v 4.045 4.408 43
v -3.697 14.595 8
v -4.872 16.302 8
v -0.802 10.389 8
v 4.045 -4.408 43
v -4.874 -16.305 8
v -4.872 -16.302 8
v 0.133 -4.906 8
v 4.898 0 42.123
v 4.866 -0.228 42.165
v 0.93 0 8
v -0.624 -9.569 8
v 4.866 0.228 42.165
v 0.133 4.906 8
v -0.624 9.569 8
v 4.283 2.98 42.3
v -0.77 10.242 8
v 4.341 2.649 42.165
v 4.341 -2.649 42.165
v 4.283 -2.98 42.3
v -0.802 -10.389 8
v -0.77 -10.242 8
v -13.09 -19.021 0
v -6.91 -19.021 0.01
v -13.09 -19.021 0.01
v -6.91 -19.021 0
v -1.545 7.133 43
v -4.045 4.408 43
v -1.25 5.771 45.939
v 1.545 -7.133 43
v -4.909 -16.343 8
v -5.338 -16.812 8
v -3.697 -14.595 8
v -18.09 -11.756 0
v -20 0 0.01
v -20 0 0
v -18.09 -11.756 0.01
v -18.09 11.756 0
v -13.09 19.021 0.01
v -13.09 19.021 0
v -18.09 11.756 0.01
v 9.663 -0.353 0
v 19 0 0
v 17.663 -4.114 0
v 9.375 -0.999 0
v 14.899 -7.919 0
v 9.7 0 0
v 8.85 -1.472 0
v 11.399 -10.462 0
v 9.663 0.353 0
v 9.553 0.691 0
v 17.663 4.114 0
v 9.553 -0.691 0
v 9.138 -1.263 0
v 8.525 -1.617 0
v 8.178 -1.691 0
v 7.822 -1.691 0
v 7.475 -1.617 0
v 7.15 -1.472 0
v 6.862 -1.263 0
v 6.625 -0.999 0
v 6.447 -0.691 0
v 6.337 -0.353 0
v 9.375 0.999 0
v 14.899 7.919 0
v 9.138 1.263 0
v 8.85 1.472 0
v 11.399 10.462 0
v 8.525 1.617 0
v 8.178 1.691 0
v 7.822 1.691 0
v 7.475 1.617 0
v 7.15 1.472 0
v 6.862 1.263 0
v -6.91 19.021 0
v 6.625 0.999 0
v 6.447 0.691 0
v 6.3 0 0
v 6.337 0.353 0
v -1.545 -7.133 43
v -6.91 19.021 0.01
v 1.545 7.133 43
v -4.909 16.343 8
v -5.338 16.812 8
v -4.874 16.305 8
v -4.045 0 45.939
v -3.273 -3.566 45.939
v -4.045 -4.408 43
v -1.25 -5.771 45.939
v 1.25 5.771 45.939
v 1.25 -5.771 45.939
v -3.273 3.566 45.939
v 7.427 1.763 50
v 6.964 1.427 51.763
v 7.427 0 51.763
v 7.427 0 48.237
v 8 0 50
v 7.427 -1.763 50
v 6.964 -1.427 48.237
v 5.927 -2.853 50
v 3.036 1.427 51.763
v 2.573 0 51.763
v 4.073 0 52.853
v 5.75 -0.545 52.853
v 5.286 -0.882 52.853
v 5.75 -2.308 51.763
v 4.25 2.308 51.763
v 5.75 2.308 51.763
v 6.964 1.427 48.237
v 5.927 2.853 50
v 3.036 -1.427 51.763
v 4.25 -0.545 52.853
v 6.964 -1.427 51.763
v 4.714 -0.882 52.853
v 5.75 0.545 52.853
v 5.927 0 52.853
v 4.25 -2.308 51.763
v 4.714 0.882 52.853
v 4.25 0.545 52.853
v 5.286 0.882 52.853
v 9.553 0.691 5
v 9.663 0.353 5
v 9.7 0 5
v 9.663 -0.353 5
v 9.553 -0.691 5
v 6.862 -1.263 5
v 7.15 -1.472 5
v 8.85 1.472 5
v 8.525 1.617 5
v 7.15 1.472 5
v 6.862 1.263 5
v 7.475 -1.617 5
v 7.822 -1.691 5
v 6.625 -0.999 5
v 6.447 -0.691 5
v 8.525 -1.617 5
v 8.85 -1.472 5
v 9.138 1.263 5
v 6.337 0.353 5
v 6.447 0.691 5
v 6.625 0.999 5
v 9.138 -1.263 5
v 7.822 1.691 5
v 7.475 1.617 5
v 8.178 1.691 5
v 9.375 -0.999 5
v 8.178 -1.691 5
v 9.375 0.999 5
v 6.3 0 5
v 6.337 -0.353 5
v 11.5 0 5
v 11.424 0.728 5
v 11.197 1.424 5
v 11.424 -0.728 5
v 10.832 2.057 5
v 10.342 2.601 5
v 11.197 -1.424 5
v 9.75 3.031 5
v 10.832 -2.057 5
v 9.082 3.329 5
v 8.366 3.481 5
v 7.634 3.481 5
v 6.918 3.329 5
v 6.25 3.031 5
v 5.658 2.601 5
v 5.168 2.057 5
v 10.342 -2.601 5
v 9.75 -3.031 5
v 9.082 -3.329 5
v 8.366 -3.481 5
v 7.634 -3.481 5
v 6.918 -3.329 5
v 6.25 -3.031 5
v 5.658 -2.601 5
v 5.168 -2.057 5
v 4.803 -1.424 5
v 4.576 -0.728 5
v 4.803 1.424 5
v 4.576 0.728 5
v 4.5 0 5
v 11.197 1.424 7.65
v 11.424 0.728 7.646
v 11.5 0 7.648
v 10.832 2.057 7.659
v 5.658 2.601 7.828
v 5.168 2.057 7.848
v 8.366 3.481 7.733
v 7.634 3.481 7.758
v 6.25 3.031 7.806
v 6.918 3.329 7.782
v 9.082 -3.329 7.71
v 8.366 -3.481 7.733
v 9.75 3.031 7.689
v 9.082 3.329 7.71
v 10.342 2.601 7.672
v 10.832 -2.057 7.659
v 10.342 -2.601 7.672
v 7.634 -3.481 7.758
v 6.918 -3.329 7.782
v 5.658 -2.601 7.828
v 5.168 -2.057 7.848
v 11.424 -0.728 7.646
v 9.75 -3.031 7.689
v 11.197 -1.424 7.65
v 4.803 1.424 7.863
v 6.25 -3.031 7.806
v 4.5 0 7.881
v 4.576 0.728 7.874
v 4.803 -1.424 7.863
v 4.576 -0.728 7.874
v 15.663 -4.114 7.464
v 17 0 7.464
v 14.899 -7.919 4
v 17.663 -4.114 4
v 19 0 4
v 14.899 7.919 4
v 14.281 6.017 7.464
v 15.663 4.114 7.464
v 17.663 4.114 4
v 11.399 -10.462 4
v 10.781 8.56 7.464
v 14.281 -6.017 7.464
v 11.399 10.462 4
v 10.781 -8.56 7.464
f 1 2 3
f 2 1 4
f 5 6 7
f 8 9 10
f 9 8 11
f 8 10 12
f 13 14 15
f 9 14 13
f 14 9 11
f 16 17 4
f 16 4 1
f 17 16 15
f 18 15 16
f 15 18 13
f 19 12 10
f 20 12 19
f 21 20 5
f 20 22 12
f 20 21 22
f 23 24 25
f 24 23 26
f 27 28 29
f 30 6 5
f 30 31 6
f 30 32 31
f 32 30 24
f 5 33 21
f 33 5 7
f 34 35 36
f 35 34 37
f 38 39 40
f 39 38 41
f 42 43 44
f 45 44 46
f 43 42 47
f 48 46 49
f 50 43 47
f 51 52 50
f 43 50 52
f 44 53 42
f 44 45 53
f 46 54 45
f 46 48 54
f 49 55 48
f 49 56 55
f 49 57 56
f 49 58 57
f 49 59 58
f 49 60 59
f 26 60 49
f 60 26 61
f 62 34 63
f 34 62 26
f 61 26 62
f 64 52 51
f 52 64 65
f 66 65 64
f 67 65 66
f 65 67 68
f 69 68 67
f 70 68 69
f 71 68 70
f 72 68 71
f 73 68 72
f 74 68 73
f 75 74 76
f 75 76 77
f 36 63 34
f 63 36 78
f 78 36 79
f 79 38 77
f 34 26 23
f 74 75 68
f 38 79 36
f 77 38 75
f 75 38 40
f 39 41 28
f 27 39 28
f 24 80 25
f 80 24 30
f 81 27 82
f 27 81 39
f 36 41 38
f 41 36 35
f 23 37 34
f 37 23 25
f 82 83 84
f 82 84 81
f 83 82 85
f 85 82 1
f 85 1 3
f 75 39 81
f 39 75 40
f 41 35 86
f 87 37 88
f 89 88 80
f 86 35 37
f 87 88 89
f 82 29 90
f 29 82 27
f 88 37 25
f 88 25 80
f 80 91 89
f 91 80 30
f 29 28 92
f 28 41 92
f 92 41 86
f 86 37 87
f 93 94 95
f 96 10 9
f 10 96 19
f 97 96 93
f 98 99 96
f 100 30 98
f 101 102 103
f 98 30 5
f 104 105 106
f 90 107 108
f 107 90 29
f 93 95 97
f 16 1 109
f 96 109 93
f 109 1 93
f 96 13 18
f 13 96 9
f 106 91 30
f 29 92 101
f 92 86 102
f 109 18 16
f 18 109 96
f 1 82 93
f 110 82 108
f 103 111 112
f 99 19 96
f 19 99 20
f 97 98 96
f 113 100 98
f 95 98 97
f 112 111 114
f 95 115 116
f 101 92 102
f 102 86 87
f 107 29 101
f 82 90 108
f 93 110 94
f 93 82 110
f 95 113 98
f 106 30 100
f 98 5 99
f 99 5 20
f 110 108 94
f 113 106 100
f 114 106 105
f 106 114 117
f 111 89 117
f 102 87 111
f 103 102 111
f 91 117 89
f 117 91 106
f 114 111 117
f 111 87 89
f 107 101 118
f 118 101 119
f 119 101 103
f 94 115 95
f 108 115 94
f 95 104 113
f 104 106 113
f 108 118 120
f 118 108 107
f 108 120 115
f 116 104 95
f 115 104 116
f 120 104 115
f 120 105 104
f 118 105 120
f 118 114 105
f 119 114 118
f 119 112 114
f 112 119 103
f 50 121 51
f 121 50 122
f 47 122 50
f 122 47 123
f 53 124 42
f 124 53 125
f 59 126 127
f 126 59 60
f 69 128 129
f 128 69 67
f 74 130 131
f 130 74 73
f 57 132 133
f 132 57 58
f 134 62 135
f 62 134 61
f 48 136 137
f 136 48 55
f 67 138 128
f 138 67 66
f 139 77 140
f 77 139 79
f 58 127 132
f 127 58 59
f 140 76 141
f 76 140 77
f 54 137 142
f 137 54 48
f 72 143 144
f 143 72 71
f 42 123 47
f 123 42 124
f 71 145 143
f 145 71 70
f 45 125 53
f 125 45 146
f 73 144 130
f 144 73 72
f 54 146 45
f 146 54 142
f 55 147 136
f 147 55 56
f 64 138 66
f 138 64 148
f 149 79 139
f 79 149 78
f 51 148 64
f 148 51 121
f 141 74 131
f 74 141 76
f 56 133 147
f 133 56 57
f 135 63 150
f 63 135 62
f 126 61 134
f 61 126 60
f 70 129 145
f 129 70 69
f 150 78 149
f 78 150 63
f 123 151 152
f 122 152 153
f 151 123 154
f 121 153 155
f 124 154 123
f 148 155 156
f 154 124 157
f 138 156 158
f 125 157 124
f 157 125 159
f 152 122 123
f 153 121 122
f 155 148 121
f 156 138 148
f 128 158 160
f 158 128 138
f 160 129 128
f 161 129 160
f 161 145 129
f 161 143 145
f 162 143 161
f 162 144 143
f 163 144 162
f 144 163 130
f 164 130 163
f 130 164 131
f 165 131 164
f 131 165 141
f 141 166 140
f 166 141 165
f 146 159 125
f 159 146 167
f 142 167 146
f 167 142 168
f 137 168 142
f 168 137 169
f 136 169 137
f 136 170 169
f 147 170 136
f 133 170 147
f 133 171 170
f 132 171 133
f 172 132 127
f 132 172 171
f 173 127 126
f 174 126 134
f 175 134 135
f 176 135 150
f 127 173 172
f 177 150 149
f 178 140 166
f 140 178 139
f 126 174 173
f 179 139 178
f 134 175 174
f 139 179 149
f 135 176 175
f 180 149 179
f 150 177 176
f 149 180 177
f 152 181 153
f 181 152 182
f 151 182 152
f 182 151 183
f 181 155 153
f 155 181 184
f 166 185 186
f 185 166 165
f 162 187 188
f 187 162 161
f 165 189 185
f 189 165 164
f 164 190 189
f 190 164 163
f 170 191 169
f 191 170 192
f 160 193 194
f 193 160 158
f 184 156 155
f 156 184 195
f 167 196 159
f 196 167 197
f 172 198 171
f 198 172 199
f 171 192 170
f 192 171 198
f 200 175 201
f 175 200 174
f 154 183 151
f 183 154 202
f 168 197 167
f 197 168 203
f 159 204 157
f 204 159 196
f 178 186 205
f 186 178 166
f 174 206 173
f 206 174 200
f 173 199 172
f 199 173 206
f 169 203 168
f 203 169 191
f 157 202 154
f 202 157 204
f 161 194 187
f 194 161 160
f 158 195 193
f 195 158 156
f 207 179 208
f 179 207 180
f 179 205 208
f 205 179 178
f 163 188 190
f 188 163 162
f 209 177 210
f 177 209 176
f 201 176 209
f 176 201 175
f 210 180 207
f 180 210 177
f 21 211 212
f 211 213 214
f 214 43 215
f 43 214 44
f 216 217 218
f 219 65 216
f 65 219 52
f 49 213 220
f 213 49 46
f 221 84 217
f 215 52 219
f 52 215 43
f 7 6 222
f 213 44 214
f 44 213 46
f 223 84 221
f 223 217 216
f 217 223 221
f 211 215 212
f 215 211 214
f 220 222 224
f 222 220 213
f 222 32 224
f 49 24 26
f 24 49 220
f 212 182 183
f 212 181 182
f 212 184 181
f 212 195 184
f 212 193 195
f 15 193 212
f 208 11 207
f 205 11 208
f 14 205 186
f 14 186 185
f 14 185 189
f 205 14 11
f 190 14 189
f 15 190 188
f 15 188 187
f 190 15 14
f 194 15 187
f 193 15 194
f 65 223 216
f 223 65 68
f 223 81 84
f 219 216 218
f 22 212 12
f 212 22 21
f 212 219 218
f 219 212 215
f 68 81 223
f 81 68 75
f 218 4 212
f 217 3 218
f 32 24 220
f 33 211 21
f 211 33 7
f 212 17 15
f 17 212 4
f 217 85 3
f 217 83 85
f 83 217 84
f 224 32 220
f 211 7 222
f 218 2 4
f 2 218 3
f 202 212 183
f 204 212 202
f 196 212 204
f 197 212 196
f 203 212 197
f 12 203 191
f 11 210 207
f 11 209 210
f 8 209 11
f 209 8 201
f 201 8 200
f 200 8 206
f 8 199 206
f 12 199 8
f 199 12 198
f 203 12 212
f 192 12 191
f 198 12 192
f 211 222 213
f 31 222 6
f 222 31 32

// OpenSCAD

build_base();

/*[Global]*/
quality = 10;   //[10:10:120]

/*[Base]*/
screw_hole = 1;      //[1:yes,0:no]
base_screw_hole_offset = 8;
base_thickness = 8;
base_top_radius = 7;
base_smoothing = 4;

/*[Arm]*/
shoulder_radius = 10;
shoulder_offset = -10;
upper_arm_length = 35;
elbow_radius = 5;
elbow_offset = 0;
//Set to 0 if you don't want the end hook
fore_arm_length = 7;
fist_radius = 3;
//Set equal to Elbow Offset if you don't want the end hook
fist_offset = 5;

/*[Screw]*/
screw_shaft_radius = 1.7;
screw_head_radius = 3.5;
screw_head_depth = 3;

/* [Hidden] */

base_z = base_thickness - base_smoothing;
arm_len = upper_arm_length + base_thickness;
knob2_z = fore_arm_length + base_thickness + upper_arm_length;

module serial_hull()
  {
    // let i be the index of each of our children, but the last one
    for(i=[0:$children-2])
      hull() // we then create a hull between child i and i+1
      {
        children(i); // use child() in older versions of Openscad!
        children(i+1); // this shape is i in the next iteration!
      }
  }


module arm(){
    serial_hull(){
        translate([shoulder_offset,0,0]) scale([1,2,1]) cylinder(r=shoulder_radius,h=0.01,$fn=quality);
        translate([elbow_offset,0,arm_len]) scale([1,1.5,1]) sphere(r=elbow_radius,$fn=quality);
        translate([fist_offset,0,knob2_z]) scale([1,1,1]) sphere(r=fist_radius,$fn=quality);
    }
    
}

module base(){
    hull(){
        difference(){
            arm();
            translate([0,0,50+base_z + base_smoothing]) cube(size=100,center=true);
        }
        difference(){
            minkowski(){
                    translate([base_screw_hole_offset,0,0]) scale([1,1,1]) cylinder(r = base_top_radius, h=base_z,$fn=quality);
                sphere(r=base_smoothing,$fn=quality/2);
            }
            translate([0,0,-50]) cube(size=100,center=true);
        }
    }
}

module build_base(){
    arm();
    difference(){
        base();
        if(screw_hole==1){
            translate([base_screw_hole_offset,0,0]) cylinder(r=screw_shaft_radius,h = arm_len,$fn=30,center=true);
            translate([base_screw_hole_offset,0,base_z+base_smoothing-screw_head_depth]) cylinder(r=screw_head_radius,h=arm_len,$fn=30,center=false);
        }
    }
}
